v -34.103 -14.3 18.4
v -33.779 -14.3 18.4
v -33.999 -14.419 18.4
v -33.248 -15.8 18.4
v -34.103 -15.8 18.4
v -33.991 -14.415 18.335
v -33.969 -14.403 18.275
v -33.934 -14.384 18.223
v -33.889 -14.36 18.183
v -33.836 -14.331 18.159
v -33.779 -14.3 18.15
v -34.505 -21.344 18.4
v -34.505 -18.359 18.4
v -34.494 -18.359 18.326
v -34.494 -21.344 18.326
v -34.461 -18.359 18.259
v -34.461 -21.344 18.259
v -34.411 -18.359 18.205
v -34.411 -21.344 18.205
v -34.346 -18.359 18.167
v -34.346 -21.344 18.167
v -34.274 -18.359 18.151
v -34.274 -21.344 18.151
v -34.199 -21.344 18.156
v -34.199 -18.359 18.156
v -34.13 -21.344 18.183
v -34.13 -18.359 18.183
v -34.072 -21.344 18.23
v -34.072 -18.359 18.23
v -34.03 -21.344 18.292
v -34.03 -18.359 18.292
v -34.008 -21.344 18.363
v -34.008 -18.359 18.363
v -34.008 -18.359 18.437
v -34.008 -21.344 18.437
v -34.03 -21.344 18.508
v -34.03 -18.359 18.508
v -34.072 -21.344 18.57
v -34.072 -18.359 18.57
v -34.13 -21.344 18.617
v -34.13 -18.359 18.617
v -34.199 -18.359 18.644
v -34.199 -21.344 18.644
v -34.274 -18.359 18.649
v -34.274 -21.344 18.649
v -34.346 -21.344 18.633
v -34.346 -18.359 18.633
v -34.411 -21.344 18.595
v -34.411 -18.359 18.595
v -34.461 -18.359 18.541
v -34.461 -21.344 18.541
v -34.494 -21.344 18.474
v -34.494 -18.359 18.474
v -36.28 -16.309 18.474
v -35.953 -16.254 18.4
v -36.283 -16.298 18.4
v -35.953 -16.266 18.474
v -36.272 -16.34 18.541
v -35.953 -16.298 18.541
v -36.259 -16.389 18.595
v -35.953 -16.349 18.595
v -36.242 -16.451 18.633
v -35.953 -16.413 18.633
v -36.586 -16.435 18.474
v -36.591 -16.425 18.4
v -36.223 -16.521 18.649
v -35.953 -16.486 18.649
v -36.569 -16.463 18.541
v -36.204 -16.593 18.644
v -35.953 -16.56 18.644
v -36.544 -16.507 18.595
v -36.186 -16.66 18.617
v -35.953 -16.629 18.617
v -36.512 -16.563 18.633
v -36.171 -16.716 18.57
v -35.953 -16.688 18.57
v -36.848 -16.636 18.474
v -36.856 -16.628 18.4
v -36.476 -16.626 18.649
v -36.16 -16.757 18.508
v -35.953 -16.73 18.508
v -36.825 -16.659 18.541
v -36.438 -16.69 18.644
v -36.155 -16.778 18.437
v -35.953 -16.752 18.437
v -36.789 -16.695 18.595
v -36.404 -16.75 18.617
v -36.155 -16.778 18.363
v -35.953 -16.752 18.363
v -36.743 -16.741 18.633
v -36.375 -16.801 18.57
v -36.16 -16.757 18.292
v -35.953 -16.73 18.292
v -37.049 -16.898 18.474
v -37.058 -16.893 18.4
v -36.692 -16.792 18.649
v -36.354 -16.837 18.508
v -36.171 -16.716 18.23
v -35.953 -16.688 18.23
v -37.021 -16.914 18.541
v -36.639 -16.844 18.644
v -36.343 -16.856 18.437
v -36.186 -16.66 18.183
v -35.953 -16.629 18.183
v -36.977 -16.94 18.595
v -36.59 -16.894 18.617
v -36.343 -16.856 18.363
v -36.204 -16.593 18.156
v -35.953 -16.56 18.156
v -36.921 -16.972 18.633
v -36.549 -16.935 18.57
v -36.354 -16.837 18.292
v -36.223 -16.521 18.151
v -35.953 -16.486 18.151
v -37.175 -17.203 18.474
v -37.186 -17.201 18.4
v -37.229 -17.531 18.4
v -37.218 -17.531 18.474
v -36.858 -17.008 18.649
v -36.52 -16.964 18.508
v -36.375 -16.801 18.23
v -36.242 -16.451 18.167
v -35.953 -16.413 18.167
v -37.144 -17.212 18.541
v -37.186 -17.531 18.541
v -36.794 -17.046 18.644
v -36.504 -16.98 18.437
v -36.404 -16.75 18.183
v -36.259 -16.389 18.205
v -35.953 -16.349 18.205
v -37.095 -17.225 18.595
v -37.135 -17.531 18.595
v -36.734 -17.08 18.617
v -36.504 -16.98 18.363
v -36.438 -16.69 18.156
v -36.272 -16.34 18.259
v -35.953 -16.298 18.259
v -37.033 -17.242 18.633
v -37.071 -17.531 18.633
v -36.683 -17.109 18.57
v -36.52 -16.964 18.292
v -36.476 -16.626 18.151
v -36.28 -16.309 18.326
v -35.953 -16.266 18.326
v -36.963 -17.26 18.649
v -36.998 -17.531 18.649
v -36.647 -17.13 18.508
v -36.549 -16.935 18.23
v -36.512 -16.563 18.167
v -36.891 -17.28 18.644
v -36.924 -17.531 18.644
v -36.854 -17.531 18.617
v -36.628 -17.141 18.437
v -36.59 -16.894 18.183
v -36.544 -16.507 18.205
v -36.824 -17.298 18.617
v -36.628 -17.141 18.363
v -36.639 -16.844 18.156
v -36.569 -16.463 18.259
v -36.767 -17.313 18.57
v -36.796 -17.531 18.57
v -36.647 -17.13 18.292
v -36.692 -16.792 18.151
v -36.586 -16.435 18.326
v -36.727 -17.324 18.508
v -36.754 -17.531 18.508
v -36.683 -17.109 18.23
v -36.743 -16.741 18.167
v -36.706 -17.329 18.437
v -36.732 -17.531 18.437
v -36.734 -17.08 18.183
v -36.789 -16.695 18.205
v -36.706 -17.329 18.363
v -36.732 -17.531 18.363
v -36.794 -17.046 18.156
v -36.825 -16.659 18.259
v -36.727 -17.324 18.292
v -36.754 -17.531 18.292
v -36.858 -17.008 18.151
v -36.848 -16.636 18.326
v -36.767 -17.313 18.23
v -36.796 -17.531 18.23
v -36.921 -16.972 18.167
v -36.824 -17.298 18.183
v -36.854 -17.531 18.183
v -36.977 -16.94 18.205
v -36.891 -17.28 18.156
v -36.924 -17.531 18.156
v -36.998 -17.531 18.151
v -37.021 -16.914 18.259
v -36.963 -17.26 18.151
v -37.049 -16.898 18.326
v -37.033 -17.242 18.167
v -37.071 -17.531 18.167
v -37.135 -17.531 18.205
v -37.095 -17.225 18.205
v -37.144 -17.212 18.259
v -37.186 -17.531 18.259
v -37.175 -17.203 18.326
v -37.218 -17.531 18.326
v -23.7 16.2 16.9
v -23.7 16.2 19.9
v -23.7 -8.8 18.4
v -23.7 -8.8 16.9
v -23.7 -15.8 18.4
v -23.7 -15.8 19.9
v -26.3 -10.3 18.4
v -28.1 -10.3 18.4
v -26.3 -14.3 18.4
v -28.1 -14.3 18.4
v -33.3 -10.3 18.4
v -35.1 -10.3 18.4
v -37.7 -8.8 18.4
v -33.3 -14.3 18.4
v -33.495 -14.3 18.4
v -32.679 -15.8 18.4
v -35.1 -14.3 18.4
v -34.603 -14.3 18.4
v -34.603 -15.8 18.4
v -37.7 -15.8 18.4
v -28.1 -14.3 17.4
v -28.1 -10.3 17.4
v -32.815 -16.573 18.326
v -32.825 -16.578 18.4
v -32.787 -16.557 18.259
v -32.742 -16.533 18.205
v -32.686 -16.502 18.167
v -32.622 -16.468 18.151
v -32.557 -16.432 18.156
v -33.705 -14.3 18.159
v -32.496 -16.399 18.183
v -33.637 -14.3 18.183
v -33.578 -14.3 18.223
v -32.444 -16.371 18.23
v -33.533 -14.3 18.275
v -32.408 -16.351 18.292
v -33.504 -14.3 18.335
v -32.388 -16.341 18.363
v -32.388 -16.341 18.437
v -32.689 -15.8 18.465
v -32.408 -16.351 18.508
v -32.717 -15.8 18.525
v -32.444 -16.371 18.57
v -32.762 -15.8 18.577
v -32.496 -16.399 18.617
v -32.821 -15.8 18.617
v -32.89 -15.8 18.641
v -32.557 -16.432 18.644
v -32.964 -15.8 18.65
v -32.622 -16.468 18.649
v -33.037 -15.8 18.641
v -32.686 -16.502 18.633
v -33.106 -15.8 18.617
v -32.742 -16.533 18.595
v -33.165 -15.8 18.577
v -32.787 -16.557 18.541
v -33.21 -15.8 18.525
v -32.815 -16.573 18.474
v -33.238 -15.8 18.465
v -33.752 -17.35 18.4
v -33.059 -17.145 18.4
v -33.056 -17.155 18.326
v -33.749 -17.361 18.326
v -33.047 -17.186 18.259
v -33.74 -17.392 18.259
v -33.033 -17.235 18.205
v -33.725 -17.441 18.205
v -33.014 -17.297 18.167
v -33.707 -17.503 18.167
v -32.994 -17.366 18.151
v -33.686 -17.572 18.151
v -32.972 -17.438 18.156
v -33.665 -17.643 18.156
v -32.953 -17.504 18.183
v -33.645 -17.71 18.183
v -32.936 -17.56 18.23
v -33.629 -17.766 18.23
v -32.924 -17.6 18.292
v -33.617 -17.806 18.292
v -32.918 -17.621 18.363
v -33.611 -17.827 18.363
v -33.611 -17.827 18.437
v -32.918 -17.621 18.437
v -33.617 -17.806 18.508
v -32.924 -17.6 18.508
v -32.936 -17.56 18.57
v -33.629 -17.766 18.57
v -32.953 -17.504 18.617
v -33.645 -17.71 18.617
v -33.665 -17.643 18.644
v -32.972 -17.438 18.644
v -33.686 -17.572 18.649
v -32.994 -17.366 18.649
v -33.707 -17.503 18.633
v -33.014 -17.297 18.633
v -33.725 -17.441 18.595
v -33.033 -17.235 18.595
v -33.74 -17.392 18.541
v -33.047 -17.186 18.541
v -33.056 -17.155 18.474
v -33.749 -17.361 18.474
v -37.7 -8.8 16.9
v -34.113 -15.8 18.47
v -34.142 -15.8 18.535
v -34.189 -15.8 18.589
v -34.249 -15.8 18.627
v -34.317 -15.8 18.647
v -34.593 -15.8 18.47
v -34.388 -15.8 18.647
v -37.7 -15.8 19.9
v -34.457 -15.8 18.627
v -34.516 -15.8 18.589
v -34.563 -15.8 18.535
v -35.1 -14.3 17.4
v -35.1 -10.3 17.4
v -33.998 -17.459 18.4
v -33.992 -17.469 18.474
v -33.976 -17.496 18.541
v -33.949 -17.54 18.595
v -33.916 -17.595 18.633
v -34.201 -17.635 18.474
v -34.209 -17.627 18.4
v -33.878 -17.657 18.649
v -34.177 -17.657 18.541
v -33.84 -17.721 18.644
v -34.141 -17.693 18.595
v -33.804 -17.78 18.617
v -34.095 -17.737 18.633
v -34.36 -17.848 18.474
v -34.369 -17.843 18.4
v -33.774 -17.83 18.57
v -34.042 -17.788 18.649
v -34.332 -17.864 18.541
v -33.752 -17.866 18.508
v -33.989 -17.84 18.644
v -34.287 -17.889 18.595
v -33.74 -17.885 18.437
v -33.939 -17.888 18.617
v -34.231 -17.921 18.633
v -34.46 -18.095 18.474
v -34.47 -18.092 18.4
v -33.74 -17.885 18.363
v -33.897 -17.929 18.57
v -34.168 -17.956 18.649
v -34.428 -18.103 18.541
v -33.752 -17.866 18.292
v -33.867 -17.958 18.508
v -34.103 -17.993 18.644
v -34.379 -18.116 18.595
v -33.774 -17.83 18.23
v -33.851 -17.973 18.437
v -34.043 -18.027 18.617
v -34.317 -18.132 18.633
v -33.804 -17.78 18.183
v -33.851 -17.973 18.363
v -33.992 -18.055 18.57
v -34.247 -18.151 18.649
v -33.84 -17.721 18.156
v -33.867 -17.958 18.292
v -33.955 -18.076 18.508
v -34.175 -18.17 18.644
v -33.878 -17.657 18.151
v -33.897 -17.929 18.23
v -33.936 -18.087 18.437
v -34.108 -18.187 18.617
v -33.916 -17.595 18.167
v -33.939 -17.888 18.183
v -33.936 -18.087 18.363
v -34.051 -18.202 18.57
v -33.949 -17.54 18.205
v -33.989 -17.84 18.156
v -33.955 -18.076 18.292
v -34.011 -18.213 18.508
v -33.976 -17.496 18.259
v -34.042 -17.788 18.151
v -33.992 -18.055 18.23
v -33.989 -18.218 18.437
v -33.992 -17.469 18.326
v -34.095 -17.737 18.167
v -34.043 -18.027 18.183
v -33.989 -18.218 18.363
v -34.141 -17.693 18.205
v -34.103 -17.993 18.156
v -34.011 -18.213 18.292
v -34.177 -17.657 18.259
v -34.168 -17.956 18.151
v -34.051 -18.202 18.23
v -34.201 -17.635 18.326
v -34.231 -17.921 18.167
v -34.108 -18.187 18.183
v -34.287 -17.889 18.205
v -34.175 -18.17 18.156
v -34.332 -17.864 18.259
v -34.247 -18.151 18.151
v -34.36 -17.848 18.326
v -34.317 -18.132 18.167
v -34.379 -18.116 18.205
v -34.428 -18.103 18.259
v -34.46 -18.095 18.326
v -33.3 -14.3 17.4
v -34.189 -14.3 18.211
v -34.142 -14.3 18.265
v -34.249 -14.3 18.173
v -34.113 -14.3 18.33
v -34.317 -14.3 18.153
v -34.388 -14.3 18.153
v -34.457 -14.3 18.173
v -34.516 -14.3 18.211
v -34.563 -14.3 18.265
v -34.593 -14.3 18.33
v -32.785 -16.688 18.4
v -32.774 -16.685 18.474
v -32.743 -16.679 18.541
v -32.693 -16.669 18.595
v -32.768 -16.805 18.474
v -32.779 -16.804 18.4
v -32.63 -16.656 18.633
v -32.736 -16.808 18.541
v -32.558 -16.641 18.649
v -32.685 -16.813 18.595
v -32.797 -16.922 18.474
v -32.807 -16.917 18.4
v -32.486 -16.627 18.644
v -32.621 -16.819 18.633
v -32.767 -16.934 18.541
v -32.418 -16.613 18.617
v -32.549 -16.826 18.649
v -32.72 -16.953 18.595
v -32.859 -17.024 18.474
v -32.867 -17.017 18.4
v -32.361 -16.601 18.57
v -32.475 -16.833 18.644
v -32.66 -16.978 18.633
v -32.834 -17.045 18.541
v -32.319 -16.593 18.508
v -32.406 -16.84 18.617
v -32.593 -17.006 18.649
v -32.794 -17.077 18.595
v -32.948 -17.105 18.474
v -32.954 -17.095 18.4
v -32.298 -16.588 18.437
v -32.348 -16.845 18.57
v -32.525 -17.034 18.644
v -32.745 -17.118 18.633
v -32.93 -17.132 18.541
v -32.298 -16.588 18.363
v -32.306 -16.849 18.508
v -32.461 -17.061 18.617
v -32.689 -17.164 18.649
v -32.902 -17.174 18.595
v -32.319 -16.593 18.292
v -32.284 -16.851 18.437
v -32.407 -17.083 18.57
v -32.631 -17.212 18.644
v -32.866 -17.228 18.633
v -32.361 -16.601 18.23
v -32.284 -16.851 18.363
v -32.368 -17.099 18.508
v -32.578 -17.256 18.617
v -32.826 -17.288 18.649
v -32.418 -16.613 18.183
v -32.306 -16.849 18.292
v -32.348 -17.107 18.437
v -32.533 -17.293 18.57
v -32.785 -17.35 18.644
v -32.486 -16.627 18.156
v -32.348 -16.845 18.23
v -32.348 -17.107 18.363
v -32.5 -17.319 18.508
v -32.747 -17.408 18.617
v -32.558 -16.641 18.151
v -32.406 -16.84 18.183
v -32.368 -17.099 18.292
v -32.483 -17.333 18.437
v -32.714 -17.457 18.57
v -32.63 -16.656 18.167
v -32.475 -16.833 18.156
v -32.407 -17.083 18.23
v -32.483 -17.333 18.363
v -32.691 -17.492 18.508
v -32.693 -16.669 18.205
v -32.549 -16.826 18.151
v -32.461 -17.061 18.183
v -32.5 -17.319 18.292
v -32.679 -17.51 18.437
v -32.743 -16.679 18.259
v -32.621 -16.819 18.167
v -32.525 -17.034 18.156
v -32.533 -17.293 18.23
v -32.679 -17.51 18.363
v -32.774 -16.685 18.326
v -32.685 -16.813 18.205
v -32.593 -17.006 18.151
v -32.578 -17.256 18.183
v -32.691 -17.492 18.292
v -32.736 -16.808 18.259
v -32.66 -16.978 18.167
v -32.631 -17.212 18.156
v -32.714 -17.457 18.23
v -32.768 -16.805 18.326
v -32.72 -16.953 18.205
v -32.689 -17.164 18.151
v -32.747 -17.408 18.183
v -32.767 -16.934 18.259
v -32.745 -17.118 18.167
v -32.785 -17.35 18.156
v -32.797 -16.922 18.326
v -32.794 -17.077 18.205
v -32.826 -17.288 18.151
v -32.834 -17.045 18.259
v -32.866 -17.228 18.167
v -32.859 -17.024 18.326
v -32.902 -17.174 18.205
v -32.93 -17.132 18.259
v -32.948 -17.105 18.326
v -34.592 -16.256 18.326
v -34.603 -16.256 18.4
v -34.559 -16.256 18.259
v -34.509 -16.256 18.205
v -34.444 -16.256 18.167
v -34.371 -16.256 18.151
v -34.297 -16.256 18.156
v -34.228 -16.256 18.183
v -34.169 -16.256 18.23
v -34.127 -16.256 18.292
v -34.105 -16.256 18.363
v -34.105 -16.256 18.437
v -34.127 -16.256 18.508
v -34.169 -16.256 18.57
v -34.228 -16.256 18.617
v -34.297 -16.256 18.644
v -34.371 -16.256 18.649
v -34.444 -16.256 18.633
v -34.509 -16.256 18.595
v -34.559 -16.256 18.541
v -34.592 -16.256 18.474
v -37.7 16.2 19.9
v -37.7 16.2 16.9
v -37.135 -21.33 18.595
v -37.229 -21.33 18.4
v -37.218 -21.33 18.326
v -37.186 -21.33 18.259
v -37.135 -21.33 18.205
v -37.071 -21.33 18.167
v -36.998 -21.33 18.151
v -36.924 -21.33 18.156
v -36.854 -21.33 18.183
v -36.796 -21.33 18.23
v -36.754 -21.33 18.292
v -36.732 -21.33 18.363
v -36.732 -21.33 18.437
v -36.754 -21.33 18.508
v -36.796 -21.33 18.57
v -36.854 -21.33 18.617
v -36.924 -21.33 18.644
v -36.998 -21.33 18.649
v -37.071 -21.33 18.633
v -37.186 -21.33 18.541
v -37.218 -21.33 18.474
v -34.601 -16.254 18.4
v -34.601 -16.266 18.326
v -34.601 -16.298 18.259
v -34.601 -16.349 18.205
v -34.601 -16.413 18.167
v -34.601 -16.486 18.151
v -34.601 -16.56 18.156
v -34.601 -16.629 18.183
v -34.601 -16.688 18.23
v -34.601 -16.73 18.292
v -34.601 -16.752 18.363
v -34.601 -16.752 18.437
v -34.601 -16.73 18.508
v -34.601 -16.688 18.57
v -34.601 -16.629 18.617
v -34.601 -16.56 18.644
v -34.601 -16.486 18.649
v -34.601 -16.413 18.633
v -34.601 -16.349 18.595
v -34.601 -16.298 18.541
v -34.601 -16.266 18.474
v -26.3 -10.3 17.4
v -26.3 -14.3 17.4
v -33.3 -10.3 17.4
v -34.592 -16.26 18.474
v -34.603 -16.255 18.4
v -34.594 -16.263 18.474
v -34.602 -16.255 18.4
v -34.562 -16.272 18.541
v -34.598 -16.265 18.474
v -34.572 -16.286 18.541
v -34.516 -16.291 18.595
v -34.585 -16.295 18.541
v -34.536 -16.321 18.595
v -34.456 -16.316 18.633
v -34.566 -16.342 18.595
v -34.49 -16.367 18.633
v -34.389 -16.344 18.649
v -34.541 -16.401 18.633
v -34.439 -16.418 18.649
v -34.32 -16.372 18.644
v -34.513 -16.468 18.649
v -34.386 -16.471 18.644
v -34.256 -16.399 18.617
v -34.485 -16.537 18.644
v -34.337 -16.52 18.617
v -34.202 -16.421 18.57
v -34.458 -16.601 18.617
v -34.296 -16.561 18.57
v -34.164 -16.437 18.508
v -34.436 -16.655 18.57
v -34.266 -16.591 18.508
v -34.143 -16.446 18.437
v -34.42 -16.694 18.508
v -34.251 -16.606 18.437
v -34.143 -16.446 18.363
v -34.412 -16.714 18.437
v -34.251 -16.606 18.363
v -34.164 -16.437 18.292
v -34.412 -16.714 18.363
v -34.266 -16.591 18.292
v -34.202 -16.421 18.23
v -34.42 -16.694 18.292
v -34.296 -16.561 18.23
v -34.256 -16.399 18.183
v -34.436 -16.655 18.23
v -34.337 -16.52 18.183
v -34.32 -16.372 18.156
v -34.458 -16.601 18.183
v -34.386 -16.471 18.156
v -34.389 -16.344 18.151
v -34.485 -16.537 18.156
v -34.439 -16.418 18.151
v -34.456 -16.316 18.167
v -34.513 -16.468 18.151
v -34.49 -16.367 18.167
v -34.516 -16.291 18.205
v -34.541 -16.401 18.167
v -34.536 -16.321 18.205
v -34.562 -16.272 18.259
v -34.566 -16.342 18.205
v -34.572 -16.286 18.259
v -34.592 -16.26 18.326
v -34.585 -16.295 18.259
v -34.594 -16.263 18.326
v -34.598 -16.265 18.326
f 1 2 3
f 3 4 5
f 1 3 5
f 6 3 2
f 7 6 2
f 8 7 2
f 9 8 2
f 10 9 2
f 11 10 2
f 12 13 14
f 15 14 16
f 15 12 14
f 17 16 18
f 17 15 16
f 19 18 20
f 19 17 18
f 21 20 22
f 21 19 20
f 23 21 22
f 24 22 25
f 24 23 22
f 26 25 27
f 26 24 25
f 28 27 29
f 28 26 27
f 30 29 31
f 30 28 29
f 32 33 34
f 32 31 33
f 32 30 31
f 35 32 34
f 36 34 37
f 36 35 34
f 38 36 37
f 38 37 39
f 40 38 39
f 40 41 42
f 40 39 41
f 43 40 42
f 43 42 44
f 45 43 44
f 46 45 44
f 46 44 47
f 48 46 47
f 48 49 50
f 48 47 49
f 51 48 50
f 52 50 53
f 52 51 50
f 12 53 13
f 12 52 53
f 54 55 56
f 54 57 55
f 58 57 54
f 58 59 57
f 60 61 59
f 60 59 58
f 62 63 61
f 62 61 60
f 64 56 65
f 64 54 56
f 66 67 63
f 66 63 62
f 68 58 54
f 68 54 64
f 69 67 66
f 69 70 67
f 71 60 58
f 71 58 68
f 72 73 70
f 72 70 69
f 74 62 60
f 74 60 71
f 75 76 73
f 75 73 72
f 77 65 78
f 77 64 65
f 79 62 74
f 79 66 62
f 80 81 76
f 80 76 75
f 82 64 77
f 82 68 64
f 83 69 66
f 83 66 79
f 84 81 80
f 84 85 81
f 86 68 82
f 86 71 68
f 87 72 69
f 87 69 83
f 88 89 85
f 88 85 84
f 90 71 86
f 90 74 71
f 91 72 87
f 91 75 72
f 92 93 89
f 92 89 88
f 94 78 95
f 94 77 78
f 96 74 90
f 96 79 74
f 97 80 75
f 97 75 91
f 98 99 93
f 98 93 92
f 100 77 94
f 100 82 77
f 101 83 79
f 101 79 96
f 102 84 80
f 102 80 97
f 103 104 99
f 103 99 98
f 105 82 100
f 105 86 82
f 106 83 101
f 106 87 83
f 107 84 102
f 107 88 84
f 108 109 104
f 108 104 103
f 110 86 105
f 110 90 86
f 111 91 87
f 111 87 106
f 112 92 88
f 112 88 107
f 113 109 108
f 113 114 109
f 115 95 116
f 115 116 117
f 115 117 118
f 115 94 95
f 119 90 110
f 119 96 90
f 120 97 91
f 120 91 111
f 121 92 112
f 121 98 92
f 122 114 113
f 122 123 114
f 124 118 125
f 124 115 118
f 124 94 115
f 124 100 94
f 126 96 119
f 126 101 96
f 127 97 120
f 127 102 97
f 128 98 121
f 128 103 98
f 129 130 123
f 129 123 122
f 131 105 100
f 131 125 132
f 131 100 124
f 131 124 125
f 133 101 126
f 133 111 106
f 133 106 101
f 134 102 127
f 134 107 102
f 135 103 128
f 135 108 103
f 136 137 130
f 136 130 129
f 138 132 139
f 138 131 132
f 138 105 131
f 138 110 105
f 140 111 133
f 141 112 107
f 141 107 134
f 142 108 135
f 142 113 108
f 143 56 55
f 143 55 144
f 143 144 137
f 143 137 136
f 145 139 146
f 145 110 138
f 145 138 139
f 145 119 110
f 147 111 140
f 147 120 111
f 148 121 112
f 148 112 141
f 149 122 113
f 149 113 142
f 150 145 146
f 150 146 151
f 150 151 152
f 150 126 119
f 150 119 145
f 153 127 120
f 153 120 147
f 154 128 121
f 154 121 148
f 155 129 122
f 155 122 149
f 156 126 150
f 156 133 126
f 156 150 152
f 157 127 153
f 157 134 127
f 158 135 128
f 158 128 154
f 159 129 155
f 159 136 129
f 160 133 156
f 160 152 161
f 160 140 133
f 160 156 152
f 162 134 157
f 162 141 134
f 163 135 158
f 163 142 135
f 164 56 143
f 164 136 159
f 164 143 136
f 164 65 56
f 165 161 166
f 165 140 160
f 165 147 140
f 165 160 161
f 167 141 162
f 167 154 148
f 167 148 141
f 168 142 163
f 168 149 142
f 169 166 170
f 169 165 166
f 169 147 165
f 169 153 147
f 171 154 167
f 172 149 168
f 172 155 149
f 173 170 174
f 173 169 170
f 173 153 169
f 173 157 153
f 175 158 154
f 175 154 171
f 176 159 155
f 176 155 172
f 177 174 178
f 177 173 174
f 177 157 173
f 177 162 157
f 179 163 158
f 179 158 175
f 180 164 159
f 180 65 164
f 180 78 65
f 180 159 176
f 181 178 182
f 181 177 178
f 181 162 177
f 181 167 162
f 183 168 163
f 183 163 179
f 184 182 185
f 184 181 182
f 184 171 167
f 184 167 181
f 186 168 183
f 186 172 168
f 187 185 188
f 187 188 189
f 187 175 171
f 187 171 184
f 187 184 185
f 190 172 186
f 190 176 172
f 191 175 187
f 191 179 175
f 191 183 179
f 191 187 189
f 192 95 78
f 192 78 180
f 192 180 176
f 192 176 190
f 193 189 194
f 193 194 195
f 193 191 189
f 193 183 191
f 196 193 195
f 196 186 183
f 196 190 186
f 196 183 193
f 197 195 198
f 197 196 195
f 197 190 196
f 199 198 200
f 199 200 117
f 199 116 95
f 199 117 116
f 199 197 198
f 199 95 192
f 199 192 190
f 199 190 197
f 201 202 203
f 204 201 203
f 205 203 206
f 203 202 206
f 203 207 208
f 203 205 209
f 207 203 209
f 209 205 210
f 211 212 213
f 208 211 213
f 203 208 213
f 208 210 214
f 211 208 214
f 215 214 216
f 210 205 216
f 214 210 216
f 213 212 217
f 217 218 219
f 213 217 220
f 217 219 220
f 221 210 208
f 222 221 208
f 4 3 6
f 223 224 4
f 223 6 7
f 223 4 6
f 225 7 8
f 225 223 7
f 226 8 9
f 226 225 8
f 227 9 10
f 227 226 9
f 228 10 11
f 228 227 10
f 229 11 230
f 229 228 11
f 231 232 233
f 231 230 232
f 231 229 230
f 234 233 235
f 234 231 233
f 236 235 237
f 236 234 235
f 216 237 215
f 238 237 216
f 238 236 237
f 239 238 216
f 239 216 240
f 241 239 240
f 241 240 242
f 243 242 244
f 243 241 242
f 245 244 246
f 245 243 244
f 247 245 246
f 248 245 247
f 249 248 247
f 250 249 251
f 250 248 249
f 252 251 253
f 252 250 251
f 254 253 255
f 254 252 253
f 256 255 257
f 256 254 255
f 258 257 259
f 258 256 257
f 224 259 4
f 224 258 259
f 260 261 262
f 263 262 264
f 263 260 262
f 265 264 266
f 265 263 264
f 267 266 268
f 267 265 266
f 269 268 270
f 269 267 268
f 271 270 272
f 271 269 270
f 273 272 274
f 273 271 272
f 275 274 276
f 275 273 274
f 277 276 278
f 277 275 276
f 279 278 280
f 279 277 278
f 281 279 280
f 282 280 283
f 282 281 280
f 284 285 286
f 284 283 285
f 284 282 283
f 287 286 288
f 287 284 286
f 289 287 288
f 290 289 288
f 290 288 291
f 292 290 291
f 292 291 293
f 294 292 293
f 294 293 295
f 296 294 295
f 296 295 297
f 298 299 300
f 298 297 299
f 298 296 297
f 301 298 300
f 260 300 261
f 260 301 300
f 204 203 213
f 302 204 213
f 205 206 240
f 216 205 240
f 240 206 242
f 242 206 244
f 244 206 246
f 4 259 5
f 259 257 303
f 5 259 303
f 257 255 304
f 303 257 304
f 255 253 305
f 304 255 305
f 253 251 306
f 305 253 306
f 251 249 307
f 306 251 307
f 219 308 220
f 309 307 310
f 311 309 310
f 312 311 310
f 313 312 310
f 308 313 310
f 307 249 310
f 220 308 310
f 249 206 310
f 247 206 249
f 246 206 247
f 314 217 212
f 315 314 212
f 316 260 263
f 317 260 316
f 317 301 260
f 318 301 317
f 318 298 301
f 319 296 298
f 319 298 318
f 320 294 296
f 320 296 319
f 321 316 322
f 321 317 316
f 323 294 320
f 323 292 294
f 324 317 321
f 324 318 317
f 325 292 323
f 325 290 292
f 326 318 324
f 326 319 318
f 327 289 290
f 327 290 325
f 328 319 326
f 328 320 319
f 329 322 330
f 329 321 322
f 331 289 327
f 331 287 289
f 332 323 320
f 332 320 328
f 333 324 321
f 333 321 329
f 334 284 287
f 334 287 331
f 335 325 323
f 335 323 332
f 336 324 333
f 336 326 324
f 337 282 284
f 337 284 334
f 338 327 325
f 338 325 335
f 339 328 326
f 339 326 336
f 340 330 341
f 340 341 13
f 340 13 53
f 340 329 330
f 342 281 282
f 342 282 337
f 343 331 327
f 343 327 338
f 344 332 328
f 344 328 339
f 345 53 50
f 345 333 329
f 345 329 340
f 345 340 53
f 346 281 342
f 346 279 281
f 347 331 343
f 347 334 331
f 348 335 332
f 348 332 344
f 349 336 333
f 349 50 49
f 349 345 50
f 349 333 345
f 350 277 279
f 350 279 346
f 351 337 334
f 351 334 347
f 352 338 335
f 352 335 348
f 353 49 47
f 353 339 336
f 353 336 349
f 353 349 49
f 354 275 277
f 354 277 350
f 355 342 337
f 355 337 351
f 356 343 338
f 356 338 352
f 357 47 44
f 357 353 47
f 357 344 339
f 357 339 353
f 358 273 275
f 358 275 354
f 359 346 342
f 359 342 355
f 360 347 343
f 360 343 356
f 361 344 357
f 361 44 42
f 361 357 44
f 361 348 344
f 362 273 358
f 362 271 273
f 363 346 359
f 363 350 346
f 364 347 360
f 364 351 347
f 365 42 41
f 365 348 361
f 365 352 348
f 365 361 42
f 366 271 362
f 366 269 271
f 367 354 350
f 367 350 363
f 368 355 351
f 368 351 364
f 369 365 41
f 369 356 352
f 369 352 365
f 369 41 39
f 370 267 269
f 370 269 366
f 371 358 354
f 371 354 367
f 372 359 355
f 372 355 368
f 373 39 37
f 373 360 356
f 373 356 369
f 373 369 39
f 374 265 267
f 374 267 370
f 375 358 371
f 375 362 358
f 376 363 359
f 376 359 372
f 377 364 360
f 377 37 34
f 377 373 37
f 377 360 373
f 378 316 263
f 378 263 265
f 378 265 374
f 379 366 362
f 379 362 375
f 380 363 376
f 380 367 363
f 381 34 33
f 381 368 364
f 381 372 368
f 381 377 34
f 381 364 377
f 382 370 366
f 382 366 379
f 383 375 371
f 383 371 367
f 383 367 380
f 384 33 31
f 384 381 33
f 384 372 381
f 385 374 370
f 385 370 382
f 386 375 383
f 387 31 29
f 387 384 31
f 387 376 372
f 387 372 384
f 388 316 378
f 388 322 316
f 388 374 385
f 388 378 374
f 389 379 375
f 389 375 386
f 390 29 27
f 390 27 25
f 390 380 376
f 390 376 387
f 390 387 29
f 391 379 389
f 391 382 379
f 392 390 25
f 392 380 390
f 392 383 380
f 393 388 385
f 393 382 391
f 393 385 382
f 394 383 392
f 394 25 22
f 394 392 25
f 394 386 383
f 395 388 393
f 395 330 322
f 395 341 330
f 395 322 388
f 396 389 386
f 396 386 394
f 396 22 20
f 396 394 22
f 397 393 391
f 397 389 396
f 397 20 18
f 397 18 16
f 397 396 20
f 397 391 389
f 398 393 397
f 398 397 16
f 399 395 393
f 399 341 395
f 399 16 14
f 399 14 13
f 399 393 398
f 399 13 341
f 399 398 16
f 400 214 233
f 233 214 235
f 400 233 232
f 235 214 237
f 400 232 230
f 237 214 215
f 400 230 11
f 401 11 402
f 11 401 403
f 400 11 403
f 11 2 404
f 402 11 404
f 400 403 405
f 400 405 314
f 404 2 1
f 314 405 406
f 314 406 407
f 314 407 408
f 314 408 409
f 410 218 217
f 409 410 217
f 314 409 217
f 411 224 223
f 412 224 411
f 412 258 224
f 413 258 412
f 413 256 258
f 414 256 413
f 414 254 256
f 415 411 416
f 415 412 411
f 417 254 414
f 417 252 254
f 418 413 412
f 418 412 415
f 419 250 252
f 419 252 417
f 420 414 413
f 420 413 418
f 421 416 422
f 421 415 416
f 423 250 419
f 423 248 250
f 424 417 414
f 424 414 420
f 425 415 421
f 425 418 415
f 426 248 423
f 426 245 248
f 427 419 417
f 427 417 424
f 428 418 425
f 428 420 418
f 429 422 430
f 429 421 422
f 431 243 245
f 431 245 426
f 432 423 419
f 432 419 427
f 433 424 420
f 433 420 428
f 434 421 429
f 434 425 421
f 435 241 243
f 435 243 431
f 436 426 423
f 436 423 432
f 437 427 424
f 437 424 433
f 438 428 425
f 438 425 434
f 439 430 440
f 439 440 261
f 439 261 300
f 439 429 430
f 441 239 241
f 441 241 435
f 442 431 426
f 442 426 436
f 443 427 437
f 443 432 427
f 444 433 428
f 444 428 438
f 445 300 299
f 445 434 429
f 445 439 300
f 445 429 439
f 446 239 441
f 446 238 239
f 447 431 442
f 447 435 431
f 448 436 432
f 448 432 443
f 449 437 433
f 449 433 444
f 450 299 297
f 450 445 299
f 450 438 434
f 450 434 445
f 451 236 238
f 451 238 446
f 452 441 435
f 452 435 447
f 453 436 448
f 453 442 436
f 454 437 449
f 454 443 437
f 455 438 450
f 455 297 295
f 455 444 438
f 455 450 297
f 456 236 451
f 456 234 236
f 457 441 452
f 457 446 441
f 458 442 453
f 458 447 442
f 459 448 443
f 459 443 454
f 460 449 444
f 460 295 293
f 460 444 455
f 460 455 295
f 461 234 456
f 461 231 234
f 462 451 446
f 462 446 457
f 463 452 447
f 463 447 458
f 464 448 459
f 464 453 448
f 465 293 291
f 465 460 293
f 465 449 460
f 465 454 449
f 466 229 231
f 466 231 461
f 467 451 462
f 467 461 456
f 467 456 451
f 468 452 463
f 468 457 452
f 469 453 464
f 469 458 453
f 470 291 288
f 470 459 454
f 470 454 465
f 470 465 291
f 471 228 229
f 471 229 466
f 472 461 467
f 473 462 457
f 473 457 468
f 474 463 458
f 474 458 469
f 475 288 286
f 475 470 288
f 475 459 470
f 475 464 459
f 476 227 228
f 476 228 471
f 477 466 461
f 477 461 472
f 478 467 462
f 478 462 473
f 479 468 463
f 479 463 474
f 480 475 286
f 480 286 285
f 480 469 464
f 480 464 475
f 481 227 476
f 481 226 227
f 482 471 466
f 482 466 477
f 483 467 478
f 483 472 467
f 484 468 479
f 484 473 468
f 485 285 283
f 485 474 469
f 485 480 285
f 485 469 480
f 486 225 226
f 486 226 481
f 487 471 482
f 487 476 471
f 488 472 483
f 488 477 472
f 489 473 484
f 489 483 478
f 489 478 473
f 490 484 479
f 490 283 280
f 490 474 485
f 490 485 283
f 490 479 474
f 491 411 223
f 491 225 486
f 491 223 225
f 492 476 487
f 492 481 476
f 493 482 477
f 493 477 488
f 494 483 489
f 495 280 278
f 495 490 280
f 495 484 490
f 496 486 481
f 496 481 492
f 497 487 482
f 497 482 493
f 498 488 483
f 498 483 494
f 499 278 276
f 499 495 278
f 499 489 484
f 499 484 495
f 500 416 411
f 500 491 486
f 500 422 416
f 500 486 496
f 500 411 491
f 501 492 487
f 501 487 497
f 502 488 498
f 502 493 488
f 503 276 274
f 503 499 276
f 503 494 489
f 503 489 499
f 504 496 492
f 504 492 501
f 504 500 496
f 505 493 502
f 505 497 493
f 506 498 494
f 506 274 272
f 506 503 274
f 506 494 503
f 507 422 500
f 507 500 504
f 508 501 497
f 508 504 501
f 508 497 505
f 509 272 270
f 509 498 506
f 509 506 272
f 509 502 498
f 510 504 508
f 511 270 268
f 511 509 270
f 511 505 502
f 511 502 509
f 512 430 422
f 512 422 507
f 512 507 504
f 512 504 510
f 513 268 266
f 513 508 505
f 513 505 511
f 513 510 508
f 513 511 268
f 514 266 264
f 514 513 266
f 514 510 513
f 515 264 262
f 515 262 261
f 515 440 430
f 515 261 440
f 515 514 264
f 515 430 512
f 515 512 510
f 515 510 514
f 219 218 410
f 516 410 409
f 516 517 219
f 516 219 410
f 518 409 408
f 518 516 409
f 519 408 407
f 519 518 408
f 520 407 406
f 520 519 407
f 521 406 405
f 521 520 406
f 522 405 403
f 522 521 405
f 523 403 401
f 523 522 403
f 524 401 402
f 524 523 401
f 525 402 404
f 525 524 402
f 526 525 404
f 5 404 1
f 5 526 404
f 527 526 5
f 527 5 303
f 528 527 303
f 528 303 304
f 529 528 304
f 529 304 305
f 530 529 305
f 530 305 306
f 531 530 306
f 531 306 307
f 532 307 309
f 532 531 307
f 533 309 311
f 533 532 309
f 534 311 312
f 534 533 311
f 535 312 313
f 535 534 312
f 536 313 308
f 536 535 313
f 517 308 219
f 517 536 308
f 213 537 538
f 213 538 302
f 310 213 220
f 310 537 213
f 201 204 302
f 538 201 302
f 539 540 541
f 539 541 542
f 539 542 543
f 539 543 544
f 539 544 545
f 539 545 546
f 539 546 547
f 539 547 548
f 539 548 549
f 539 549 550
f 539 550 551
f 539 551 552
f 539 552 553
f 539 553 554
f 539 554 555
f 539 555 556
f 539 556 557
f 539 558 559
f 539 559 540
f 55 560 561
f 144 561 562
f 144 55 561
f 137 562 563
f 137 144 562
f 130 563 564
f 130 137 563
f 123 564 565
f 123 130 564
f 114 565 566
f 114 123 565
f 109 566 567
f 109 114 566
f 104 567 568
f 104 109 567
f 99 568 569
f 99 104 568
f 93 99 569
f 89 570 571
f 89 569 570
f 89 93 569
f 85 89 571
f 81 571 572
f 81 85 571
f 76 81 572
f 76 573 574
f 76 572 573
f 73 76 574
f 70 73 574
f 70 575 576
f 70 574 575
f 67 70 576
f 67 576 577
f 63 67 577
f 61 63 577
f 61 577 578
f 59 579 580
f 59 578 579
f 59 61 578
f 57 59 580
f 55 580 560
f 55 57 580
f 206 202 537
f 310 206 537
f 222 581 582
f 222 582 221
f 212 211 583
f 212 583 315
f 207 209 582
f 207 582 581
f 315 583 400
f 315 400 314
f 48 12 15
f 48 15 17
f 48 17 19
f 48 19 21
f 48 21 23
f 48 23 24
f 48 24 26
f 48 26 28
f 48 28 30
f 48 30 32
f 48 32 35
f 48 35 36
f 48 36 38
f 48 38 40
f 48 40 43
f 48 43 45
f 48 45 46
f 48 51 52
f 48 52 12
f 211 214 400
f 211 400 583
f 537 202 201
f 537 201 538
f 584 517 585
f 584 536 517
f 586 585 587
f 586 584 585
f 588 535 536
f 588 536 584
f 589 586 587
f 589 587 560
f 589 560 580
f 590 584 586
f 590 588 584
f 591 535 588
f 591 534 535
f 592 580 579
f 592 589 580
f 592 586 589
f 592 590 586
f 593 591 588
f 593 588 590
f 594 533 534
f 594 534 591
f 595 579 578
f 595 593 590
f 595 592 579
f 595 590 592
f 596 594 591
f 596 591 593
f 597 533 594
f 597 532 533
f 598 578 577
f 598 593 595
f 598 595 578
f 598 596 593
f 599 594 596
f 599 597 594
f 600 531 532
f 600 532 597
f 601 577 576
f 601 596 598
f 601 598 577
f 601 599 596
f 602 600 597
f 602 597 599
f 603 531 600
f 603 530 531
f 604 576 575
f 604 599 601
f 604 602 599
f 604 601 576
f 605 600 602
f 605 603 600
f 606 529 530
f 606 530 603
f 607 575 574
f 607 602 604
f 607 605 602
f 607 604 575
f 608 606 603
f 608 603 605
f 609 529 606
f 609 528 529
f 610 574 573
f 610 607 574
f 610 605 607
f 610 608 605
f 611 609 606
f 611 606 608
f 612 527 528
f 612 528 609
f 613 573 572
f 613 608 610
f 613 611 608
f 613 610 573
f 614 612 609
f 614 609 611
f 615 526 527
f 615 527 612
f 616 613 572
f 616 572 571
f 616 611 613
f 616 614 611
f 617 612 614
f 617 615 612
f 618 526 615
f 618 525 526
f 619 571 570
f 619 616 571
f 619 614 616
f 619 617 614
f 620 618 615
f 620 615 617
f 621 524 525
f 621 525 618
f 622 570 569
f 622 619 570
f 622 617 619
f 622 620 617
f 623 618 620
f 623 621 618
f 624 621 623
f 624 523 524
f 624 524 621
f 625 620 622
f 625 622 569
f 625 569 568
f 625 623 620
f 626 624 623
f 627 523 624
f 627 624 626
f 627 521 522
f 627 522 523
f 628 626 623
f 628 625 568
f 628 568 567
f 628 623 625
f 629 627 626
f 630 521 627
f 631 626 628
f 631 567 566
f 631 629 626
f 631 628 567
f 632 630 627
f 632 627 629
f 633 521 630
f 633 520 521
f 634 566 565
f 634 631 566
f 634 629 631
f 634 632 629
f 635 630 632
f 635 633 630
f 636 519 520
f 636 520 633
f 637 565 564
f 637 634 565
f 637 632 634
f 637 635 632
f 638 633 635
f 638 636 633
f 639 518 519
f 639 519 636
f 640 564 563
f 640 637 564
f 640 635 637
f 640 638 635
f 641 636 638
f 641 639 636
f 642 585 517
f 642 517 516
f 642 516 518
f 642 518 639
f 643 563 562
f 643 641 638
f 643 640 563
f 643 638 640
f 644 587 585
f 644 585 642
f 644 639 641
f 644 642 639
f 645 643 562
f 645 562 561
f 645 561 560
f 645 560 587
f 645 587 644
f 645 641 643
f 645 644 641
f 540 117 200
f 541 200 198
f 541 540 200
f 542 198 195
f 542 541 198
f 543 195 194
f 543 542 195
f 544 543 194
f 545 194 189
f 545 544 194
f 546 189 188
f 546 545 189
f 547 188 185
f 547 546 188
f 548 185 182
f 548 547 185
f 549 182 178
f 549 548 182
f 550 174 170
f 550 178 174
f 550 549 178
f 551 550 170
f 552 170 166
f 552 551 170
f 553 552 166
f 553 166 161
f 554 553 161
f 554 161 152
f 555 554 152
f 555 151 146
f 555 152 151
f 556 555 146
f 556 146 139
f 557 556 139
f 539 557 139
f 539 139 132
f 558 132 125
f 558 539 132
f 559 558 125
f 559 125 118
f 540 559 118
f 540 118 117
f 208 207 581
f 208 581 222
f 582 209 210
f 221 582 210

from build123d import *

# Parameters (mm, degrees)
SKETCH021_W             = 14
SKETCH021_H             = 25
PAD015_DEPTH            = 3
SKETCH022_W             = 14
SKETCH022_H             = 7
PAD016_DEPTH            = 1.5
SKETCH023_W             = 1.8
SKETCH023_H             = 4
PAD017_DEPTH            = 1
SKETCH025_R             = 0.25
SKETCH027_R             = 0.25
BODY006_PLACEMENT_ANGLE = 180


with BuildPart() as part:
    # Sketch021 → Pad015 (new body)
    with BuildSketch(Plane.XY):
        Rectangle(SKETCH021_W, SKETCH021_H)
    extrude(amount=PAD015_DEPTH)

    # Sketch022 (on Face5 of Pad015) → Pad016 (join)
    with BuildSketch(Plane(origin=(0, 0, 0), x_dir=(1, 0, 0), z_dir=(0, 0, -1))):
        with Locations((0, 16)):
            Rectangle(SKETCH022_W, SKETCH022_H)
    extrude(amount=-PAD016_DEPTH)

    # Sketch023 (on Face11 of Pad016) → Pad017 (join)
    with BuildSketch(Plane.XY.offset(1.5)):
        with Locations((-3.5, -16)):
            Rectangle(SKETCH023_W, SKETCH023_H)
        with Locations((3.5, -16)):
            Rectangle(SKETCH023_W, SKETCH023_H)
    extrude(amount=PAD017_DEPTH)

    # AdditivePipe002: sweep along a path in Sketch024
    with BuildLine(Plane.XY.offset(1.5)) as additivepipe002_path:
        Line((3.652698, -18), (3.652698, -19.955732))
        ThreePointArc((3.652698, -19.955732), (3.7255554811, -20.1316255189), (3.901449, -20.204483))
        Line((3.901449, -20.204483), (5.252995, -20.204483))
        ThreePointArc((5.252995, -20.204483), (5.9787998058, -20.5051211942), (6.279438, -21.230926))
        Line((6.279438, -21.230926), (6.279438, -25.029842))
    # Sketch025 (on DatumPlane) → AdditivePipe002 (sweep)
    with BuildSketch(Plane(origin=(6.279438, -25.029842, 1.5), x_dir=(1, 0, 0), z_dir=(0, -1, 0))):
        Circle(SKETCH025_R)
    sweep(path=additivepipe002_path.line)

    # AdditivePipe003: sweep along a path in Sketch026
    with BuildLine(Plane.XY.offset(1.5)) as additivepipe003_path:
        Line((3.079145, -18), (1.9054359958, -20.158635665))
        ThreePointArc((1.9054359958, -20.158635665), (1.8760598704, -20.7128173949), (2.2882507497, -21.0844072569))
        Line((2.2882507497, -21.0844072569), (2.9810609114, -21.2900849643))
        ThreePointArc((2.9810609114, -21.2900849643), (3.3955781518, -21.5792681435), (3.554832, -22.0589447695))
        Line((3.554832, -22.0589447695), (3.554832, -25.04393))
    # Sketch027 (on DatumPlane) → AdditivePipe003 (sweep)
    with BuildSketch(Plane(origin=(3.554832, -25.04393, 1.5), x_dir=(1, 0, 0), z_dir=(0, -1, 0))):
        Circle(SKETCH027_R)
    sweep(path=additivepipe003_path.line)


with BuildPart() as part_1:
    # Body006 placement: moved
    add(part.part.moved(Location((-30.7, 3.7, 19.9))).rotate(Axis((-30.7, 3.7, 19.9), (0, 1, 0)), BODY006_PLACEMENT_ANGLE))


solid = part_1.part
